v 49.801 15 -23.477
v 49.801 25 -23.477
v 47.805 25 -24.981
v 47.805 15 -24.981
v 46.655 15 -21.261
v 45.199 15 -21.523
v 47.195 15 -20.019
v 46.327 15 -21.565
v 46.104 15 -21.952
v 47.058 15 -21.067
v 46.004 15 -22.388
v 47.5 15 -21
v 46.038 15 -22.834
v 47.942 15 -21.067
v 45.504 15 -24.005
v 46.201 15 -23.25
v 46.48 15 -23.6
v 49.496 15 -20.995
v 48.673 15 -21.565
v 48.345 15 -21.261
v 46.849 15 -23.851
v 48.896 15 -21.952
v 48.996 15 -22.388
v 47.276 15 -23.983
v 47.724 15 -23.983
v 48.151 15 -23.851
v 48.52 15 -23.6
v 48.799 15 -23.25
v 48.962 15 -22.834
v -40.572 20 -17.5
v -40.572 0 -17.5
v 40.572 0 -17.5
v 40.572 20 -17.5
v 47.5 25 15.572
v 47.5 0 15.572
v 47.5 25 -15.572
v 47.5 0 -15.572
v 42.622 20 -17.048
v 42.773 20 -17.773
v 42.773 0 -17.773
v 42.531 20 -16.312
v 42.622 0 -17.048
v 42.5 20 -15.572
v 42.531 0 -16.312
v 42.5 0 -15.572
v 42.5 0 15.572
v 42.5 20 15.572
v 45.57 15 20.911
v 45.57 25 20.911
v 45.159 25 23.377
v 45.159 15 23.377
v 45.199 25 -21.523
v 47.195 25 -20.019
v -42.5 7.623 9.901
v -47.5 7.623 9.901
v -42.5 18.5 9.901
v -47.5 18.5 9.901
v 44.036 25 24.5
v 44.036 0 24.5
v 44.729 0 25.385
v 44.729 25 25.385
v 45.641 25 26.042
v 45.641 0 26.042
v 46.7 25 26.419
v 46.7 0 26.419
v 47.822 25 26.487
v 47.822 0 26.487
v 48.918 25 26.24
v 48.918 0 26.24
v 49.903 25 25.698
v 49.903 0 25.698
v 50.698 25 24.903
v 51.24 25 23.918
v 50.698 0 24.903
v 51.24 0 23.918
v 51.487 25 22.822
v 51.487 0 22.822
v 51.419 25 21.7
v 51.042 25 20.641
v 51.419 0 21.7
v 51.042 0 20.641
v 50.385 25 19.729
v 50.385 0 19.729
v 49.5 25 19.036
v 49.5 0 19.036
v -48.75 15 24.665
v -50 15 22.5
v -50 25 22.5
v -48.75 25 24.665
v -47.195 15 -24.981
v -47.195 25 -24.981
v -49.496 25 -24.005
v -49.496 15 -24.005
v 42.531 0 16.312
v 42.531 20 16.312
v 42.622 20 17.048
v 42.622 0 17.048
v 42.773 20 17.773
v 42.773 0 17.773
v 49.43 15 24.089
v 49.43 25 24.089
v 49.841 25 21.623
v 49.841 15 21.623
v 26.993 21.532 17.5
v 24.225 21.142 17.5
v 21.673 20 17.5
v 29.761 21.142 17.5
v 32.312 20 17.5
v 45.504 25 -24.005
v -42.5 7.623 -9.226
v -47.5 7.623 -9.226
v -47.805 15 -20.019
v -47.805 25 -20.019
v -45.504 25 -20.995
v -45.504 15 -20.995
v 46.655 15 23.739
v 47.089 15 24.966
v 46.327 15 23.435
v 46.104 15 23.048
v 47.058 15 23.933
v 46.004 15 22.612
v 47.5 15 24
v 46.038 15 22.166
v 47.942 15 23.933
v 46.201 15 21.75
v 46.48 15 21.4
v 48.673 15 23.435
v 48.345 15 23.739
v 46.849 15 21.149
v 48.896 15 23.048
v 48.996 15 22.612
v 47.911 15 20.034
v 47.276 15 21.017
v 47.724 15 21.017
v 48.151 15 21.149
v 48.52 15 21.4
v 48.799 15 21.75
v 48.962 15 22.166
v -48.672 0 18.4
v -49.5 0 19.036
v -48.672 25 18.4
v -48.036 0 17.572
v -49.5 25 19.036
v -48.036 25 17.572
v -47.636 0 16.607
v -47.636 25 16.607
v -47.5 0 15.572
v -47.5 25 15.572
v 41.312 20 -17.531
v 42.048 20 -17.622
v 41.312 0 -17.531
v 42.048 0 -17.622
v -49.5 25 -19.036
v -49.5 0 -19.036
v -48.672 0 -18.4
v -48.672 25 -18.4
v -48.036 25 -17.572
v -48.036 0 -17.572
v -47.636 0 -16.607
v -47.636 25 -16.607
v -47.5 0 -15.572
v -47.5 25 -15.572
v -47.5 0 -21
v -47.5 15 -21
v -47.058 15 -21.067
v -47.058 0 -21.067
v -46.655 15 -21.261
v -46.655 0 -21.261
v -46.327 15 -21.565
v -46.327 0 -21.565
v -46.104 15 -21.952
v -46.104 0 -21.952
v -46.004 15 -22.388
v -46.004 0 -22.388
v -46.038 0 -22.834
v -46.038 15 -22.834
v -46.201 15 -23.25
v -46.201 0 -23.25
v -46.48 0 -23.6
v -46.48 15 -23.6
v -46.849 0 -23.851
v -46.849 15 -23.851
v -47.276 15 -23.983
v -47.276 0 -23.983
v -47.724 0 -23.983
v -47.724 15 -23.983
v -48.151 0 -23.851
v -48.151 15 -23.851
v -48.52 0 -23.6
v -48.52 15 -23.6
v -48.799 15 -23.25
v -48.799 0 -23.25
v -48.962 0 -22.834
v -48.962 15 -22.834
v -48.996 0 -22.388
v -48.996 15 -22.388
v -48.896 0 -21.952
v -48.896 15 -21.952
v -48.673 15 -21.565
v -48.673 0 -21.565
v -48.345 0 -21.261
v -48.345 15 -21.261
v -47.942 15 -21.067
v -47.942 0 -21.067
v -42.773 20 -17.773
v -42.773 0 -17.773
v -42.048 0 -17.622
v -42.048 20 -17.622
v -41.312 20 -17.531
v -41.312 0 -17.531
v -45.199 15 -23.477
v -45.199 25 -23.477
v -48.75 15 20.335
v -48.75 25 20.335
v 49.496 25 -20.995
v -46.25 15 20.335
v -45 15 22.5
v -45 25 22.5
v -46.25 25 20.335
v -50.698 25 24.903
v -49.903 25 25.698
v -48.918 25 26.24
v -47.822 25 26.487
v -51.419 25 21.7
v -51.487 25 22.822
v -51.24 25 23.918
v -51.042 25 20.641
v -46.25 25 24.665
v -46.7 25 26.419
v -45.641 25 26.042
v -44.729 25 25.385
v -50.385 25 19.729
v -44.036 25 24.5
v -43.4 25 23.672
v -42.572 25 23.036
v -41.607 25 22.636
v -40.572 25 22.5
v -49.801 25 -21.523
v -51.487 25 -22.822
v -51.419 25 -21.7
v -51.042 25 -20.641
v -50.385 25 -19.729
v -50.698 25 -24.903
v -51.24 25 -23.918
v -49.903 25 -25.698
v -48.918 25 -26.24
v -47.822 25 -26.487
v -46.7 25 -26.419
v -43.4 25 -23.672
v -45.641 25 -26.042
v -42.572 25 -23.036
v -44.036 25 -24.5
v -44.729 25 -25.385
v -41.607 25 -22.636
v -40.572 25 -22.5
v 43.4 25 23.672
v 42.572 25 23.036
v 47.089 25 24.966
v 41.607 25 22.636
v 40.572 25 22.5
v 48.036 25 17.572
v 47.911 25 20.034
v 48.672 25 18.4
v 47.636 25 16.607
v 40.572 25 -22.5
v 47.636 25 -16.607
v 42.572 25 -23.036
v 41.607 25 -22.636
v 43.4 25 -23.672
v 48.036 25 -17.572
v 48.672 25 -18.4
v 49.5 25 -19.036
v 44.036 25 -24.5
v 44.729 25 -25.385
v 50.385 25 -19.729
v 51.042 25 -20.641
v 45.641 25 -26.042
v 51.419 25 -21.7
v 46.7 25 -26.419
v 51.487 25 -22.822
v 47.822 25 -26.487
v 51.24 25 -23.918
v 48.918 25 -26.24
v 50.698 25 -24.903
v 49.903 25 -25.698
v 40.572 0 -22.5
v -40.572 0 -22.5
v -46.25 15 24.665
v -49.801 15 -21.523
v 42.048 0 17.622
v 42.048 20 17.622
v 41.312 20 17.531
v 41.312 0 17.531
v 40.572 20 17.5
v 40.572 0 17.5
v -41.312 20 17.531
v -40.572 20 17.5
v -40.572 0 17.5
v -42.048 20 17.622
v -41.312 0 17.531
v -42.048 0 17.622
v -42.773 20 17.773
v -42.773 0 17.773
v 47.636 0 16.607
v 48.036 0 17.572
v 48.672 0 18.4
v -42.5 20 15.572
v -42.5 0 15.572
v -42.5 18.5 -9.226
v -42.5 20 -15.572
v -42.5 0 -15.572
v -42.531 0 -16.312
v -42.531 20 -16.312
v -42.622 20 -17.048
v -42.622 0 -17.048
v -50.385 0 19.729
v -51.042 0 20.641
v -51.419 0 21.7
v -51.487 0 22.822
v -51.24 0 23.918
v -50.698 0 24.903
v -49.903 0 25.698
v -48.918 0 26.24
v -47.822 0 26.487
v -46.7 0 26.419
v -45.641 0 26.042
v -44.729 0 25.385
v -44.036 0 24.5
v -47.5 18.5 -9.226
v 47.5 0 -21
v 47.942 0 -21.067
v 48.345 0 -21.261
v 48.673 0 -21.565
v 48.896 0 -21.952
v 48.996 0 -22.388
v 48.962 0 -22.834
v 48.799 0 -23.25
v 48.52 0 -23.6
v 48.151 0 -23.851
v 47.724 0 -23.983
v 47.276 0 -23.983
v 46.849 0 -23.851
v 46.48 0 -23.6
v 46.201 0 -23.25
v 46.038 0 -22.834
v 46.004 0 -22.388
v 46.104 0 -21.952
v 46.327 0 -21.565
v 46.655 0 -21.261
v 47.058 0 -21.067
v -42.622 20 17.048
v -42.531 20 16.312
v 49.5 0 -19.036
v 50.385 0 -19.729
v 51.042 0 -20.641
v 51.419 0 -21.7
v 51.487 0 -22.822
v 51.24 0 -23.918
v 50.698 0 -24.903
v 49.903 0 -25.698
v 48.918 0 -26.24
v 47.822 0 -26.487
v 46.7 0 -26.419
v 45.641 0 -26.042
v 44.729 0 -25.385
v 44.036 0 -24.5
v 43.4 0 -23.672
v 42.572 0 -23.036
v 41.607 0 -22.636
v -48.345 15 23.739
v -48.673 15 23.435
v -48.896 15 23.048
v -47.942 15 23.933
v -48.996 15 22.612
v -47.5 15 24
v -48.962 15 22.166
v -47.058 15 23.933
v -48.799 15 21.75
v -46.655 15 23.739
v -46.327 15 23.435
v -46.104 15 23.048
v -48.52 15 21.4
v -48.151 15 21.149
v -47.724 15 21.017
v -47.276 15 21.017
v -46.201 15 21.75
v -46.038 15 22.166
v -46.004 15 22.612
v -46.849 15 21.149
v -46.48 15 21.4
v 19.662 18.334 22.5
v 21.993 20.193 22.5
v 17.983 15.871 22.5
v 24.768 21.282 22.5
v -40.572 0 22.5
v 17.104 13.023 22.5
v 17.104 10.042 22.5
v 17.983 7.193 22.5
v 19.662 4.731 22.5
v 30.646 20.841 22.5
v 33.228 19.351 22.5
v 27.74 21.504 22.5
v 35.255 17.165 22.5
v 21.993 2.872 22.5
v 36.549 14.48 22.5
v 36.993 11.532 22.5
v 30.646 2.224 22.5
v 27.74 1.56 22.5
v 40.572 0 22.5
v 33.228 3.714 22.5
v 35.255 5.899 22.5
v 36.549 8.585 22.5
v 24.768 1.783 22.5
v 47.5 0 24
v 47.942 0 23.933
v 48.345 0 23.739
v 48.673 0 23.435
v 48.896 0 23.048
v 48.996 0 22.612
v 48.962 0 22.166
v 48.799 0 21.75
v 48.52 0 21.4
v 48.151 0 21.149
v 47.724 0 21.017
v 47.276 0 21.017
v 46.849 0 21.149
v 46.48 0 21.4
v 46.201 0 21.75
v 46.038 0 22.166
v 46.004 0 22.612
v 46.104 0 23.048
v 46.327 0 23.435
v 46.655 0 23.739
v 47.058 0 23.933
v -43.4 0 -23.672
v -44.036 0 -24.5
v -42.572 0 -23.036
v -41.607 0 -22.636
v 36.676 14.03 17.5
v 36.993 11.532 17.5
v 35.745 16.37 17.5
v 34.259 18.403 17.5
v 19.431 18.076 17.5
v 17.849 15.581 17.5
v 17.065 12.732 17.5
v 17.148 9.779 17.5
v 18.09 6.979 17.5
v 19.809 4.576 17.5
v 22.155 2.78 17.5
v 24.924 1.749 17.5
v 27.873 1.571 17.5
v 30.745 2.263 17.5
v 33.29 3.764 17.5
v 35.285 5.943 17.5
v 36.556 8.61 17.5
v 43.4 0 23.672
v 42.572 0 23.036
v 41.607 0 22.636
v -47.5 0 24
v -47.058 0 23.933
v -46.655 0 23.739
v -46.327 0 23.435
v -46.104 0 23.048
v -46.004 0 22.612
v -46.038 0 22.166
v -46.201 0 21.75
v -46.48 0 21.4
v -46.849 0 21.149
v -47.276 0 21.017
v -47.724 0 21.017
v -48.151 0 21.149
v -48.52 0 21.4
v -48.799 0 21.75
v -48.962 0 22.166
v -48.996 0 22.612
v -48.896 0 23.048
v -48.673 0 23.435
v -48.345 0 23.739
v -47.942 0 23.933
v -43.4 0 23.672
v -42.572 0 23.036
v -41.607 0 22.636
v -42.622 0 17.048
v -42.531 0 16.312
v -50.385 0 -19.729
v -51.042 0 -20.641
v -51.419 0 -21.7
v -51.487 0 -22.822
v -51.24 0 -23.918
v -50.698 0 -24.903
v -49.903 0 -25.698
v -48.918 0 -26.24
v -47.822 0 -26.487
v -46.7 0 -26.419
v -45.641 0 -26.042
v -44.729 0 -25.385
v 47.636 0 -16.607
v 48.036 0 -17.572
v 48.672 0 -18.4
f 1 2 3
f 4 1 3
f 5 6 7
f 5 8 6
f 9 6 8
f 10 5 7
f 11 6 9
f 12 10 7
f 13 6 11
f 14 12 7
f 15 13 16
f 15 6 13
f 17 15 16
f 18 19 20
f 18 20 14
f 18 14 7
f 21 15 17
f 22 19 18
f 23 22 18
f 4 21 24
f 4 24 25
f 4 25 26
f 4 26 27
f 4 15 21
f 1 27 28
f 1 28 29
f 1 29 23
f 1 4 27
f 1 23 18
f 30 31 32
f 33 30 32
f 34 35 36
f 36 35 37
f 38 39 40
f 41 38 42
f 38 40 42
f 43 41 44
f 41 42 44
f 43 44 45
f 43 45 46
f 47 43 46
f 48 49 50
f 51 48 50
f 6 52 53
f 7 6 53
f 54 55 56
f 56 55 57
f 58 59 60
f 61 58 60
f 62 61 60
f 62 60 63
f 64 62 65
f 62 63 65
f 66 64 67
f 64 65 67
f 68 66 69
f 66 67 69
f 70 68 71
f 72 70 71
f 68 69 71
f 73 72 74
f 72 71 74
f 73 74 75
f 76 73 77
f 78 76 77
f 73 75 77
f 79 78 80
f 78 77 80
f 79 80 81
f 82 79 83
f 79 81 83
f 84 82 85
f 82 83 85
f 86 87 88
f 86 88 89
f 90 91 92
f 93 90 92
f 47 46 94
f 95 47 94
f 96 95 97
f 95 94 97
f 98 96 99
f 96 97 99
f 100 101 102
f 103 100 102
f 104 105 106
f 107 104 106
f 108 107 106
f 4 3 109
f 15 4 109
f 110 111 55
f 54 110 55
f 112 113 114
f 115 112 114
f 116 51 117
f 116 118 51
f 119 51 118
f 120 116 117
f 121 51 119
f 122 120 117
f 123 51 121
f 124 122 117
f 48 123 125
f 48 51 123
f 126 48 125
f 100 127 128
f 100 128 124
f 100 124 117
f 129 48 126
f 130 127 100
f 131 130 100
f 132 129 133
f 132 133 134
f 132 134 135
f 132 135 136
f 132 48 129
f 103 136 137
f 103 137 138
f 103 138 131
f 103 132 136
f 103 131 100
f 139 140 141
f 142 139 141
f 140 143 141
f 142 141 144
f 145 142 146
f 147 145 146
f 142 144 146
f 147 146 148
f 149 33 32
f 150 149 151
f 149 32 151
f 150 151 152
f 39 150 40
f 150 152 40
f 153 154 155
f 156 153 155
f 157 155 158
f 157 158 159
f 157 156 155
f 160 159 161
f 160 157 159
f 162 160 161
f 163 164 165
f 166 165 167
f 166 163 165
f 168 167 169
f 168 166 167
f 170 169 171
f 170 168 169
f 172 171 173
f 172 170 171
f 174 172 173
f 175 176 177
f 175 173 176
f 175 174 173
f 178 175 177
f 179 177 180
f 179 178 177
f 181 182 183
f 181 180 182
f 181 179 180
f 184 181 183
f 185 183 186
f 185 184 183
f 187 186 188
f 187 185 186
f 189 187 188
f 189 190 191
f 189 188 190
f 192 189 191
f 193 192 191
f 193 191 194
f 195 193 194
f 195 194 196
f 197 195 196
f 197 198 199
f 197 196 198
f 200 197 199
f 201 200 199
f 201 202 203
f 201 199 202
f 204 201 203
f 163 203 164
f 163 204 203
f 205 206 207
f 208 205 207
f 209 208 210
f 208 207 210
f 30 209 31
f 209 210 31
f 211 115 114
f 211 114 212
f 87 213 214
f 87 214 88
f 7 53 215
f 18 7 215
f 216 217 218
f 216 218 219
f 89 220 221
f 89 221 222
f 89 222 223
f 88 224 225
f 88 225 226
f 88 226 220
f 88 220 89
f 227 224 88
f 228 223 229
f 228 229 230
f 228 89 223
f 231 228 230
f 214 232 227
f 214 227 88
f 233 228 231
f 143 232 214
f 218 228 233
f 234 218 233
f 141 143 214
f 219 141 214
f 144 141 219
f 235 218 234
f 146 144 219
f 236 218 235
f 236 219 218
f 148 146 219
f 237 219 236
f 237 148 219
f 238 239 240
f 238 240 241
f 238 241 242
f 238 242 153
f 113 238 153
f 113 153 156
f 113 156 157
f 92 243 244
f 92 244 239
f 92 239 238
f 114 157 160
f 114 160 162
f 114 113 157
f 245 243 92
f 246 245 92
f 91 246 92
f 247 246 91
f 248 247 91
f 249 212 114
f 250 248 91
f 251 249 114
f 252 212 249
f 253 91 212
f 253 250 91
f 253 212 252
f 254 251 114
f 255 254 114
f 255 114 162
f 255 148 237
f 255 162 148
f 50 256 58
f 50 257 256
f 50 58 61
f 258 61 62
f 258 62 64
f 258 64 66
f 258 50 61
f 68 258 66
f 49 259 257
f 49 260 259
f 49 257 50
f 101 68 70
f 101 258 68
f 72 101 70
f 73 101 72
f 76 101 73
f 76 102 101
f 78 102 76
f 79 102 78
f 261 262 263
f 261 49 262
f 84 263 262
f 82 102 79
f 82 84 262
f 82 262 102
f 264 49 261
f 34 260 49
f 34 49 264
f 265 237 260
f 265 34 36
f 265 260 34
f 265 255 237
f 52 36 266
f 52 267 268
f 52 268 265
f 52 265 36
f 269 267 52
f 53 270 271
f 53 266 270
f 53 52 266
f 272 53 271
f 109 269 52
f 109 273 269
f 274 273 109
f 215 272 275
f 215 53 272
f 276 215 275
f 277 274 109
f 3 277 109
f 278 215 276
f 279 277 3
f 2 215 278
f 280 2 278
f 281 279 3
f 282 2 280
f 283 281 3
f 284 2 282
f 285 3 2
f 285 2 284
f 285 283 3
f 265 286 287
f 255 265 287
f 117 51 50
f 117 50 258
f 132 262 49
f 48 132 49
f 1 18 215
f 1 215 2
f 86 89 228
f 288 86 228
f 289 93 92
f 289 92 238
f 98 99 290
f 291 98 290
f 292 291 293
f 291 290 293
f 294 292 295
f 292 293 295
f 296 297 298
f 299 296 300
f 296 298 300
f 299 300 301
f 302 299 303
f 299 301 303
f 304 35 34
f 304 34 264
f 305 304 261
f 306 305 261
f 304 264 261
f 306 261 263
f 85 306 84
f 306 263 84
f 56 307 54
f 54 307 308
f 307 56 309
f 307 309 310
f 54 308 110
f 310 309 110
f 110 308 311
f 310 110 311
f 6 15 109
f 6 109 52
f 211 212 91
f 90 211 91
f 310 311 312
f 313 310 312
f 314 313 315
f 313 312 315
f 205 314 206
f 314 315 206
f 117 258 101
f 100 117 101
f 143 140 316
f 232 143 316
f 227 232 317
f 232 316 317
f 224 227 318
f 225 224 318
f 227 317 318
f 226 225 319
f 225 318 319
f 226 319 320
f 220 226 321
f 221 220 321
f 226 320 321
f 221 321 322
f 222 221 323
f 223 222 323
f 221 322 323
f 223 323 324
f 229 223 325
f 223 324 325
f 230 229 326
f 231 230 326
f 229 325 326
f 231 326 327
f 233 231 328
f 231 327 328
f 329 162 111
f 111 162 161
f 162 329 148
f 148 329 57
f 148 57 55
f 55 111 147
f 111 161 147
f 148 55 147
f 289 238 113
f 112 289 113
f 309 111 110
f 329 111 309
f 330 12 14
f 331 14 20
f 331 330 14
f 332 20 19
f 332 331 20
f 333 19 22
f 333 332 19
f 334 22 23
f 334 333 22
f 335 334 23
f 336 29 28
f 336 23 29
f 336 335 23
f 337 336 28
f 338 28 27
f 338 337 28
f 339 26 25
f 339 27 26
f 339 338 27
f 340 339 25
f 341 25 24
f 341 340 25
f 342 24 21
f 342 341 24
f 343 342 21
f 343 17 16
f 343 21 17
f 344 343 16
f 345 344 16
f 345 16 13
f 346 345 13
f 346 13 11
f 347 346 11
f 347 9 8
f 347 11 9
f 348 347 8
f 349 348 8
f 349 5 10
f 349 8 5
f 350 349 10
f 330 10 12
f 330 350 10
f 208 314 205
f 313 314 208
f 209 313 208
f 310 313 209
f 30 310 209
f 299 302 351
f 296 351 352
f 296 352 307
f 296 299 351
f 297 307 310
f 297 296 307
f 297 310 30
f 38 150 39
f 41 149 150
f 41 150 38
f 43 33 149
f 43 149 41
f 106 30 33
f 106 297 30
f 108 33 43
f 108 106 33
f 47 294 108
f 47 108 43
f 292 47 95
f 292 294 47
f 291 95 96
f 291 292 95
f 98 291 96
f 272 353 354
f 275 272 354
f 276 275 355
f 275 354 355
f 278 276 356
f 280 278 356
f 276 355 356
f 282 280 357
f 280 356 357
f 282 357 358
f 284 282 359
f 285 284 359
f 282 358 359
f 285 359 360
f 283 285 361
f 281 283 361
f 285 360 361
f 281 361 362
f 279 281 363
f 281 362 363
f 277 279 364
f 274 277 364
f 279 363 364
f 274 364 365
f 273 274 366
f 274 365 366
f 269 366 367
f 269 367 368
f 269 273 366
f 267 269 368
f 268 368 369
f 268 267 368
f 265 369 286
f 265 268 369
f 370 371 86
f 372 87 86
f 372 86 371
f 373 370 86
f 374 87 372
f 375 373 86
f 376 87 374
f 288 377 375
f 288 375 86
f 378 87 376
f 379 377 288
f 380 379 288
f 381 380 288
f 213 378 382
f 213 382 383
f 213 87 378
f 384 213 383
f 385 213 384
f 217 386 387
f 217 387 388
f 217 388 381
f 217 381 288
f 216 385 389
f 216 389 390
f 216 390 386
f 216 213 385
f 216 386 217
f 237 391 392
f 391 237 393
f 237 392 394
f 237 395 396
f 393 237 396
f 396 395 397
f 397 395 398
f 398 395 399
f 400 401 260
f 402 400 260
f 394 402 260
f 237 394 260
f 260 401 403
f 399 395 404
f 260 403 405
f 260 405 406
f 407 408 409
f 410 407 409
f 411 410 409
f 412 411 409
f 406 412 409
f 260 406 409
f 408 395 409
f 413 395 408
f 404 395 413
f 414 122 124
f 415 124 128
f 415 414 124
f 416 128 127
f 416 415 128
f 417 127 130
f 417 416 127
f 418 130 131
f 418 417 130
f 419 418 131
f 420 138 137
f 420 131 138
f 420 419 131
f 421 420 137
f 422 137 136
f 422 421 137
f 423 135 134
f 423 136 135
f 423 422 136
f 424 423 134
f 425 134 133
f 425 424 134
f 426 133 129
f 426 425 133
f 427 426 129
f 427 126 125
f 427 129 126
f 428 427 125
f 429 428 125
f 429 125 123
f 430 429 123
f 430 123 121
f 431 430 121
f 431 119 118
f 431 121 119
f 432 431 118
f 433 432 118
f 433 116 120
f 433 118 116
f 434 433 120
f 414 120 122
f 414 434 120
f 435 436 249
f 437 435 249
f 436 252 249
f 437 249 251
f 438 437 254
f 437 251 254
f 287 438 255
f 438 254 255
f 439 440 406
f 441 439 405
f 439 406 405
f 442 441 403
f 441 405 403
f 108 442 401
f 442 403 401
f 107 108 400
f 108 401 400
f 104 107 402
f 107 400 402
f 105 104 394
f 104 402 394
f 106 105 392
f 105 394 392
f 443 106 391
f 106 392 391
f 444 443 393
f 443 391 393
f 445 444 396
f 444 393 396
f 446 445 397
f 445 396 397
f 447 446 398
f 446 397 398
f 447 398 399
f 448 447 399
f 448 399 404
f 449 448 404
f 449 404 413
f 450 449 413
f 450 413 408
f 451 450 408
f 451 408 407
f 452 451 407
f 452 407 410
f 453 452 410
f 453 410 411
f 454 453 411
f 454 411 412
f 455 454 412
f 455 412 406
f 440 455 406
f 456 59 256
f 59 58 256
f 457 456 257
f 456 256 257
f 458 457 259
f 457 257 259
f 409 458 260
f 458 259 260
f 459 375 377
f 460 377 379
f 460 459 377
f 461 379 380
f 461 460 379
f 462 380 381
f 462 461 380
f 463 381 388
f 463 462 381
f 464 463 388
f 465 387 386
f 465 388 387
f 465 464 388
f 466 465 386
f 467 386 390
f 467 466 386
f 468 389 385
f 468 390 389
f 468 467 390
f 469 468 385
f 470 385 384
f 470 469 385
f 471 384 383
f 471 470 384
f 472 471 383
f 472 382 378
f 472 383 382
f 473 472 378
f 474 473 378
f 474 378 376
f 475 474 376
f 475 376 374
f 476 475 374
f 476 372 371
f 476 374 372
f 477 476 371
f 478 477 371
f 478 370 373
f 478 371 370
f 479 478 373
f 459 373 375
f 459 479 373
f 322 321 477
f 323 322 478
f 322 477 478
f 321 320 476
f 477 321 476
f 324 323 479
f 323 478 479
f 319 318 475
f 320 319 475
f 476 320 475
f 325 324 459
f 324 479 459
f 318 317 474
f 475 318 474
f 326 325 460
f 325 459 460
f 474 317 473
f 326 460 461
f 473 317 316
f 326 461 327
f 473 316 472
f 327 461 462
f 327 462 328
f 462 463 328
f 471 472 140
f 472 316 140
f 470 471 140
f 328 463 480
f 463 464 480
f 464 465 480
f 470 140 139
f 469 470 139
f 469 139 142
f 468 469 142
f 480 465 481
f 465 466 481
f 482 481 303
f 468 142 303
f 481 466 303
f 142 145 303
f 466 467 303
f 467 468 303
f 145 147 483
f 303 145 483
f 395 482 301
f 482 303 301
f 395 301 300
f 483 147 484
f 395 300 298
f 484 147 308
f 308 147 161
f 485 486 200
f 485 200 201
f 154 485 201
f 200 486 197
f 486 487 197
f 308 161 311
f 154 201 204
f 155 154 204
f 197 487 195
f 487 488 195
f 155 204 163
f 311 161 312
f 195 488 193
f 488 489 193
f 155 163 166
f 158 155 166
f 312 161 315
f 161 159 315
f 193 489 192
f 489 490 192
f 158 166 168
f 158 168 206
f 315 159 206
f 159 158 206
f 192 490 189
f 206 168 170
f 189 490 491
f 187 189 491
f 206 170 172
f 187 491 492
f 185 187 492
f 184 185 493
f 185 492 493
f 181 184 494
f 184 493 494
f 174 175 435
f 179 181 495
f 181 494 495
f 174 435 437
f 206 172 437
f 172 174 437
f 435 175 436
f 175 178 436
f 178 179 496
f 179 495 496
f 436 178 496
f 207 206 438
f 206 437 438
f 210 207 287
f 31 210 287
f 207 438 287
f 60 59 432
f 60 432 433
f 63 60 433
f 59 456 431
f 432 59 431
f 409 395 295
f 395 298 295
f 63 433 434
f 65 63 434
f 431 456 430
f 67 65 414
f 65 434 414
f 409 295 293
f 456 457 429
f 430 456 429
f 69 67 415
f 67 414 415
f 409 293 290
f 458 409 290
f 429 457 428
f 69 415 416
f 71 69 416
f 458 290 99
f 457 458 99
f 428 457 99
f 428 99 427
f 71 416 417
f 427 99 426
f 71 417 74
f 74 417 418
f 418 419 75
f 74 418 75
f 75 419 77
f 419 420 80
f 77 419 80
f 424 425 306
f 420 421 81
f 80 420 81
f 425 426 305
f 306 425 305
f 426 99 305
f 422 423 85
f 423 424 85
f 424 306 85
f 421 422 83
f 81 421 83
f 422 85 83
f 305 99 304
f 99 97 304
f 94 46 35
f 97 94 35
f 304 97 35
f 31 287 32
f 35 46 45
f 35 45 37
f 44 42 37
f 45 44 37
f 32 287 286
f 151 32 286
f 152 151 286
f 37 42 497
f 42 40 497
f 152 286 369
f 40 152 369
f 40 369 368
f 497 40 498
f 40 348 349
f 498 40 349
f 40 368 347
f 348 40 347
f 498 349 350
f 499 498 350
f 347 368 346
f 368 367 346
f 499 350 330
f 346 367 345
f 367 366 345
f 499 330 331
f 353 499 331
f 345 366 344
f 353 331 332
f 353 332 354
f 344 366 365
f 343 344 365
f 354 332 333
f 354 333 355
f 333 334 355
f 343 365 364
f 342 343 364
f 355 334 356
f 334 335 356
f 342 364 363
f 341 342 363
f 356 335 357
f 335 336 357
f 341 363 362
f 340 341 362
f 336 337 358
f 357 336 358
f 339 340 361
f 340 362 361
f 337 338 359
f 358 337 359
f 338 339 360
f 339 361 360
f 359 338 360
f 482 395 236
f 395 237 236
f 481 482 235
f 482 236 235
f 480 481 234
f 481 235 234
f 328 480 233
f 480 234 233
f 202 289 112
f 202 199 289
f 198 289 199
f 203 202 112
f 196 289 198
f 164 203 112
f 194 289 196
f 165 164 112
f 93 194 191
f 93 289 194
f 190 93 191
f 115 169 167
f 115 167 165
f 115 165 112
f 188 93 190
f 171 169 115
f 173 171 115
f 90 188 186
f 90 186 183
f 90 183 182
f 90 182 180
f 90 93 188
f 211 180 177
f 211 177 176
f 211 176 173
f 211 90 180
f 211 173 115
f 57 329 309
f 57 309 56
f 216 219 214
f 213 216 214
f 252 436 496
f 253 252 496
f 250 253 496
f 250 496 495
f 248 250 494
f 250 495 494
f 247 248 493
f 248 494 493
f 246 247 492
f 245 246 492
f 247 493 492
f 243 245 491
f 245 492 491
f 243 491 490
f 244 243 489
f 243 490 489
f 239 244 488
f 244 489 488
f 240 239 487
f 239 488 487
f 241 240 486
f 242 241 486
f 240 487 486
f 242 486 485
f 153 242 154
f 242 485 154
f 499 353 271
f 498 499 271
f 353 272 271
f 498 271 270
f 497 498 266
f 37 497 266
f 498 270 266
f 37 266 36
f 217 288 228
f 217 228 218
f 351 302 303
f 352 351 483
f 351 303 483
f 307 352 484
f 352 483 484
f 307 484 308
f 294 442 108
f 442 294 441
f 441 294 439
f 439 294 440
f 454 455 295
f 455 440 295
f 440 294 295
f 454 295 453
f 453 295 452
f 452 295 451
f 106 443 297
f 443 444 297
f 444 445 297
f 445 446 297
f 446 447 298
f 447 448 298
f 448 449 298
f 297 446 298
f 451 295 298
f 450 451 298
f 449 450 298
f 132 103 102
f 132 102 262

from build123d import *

# Parameters (mm, degrees)
SKETCH2_R           = 1.5
BOSS_EXTRUDE1_DEPTH = 25
FILLET3_R           = 4
FILLET4_R           = 4
FILLET5_R           = 4
FILLET6_R           = 4
FILLET7_R           = 4
FILLET8_R           = 4
FILLET9_R           = 4
FILLET10_R          = 4
CUT_EXTRUDE1_DEPTH  = 10
CUT_EXTRUDE2_DEPTH  = 20
SKETCH5_W           = 19.12768352
SKETCH5_H           = 10.876940682
CUT_EXTRUDE3_DEPTH  = 5
SKETCH6_R           = 10
CUT_EXTRUDE4_DEPTH  = 5


with BuildPart() as part:
    # Sketch2 → Boss-Extrude1 (new body)
    with BuildSketch(Plane(origin=(0, 0, 0), x_dir=(1, 0, 0), z_dir=(0, 1, 0))):
        with BuildLine():
            ThreePointArc((-43.5, 22.5), (-50.328427125, 25.328427125), (-47.5, 18.5))
            Line((-47.5, 18.5), (-47.5, -18.5))
            ThreePointArc((-47.5, -18.5), (-50.328427125, -25.328427125), (-43.5, -22.5))
            Line((-43.5, -22.5), (43.5, -22.5))
            ThreePointArc((43.5, -22.5), (50.328427125, -25.328427125), (47.5, -18.5))
            Line((47.5, -18.5), (47.5, 18.5))
            ThreePointArc((47.5, 18.5), (50.328427125, 25.328427125), (43.5, 22.5))
            Line((43.5, 22.5), (-43.5, 22.5))
        make_face()
        with Locations(Location((-47.5, 22.5, 0), (0, 0, 270))):
            Circle(SKETCH2_R, mode=Mode.SUBTRACT)
        with Locations(Location((-47.5, -22.5, 0), (0, 0, 270))):
            Circle(SKETCH2_R, mode=Mode.SUBTRACT)
        with Locations(Location((47.5, 22.5, 0), (0, 0, 270))):
            Circle(SKETCH2_R, mode=Mode.SUBTRACT)
        with Locations(Location((47.5, -22.5, 0), (0, 0, 270))):
            Circle(SKETCH2_R, mode=Mode.SUBTRACT)
    extrude(amount=BOSS_EXTRUDE1_DEPTH)

    # Fillet3
    fillet3_edges = [part.edges().sort_by_distance(p)[0] for p in [
        (-43.5, 12.5, -22.5),
    ]]
    fillet(fillet3_edges, radius=FILLET3_R)

    # Fillet4
    fillet4_edges = [part.edges().sort_by_distance(p)[0] for p in [
        (-47.5, 12.5, -18.5),
    ]]
    fillet(fillet4_edges, radius=FILLET4_R)

    # Fillet5
    fillet5_edges = [part.edges().sort_by_distance(p)[0] for p in [
        (47.5, 12.5, -18.5),
    ]]
    fillet(fillet5_edges, radius=FILLET5_R)

    # Fillet6
    fillet6_edges = [part.edges().sort_by_distance(p)[0] for p in [
        (43.5, 12.5, -22.5),
    ]]
    fillet(fillet6_edges, radius=FILLET6_R)

    # Fillet7
    fillet7_edges = [part.edges().sort_by_distance(p)[0] for p in [
        (47.5, 12.5, 18.5),
    ]]
    fillet(fillet7_edges, radius=FILLET7_R)

    # Fillet8
    fillet8_edges = [part.edges().sort_by_distance(p)[0] for p in [
        (43.5, 12.5, 22.5),
    ]]
    fillet(fillet8_edges, radius=FILLET8_R)

    # Fillet9
    fillet9_edges = [part.edges().sort_by_distance(p)[0] for p in [
        (-43.5, 12.5, 22.5),
    ]]
    fillet(fillet9_edges, radius=FILLET9_R)

    # Fillet10
    fillet10_edges = [part.edges().sort_by_distance(p)[0] for p in [
        (-47.5, 12.5, 18.5),
    ]]
    fillet(fillet10_edges, radius=FILLET10_R)

    # Sketch3 → Cut-Extrude1 (cut)
    with BuildSketch(Plane(origin=(0, 25, 0), x_dir=(1, 0, 0), z_dir=(0, 1, 0))):
        Polygon((45.159037956, -23.377437582), (47.089402215, -24.96605139), (49.430364258, -24.088613808), (49.840962044, -21.622562418), (47.910597785, -20.03394861), (45.569635742, -20.911386192), align=None)
        Polygon((45.198650859, 21.523377181), (47.1951056, 20.018661771), (49.496454742, 20.99528459), (49.801349141, 23.476622819), (47.8048944, 24.981338229), (45.503545258, 24.00471541), align=None)
        Polygon((-49.801349141, 21.523377181), (-47.8048944, 20.018661771), (-45.503545258, 20.99528459), (-45.198650859, 23.476622819), (-47.1951056, 24.981338229), (-49.496454742, 24.00471541), align=None)
        Polygon((-50, -22.5), (-48.75, -24.665063509), (-46.25, -24.665063509), (-45, -22.5), (-46.25, -20.334936491), (-48.75, -20.334936491), align=None)
    extrude(amount=-CUT_EXTRUDE1_DEPTH, mode=Mode.SUBTRACT)

    # Sketch4 → Cut-Extrude2 (cut)
    with BuildSketch(Plane.XZ):
        with BuildLine():
            Line((-42.5, 15.57179677), (-42.5, -15.57179677))
            ThreePointArc((-42.5, -15.57179677), (-42.568623197, -16.681079599), (-42.77344631, -17.77344631))
            ThreePointArc((-42.77344631, -17.77344631), (-41.681079599, -17.568623197), (-40.57179677, -17.5))
            Line((-40.57179677, -17.5), (40.57179677, -17.5))
            ThreePointArc((40.57179677, -17.5), (41.681079599, -17.568623197), (42.77344631, -17.77344631))
            ThreePointArc((42.77344631, -17.77344631), (42.568623197, -16.681079599), (42.5, -15.57179677))
            Line((42.5, -15.57179677), (42.5, 15.57179677))
            ThreePointArc((42.5, 15.57179677), (42.568623197, 16.681079599), (42.77344631, 17.77344631))
            ThreePointArc((42.77344631, 17.77344631), (41.681079599, 17.568623197), (40.57179677, 17.5))
            Line((40.57179677, 17.5), (-40.57179677, 17.5))
            ThreePointArc((-40.57179677, 17.5), (-41.681079599, 17.568623197), (-42.77344631, 17.77344631))
            ThreePointArc((-42.77344631, 17.77344631), (-42.568623197, 16.681079599), (-42.5, 15.57179677))
        make_face()
    extrude(amount=-CUT_EXTRUDE2_DEPTH, mode=Mode.SUBTRACT)

    # Sketch5 → Cut-Extrude3 (cut)
    with BuildSketch(Plane.ZY.offset(47.5)):
        with Locations((0.337516279, 13.061529659)):
            Rectangle(SKETCH5_W, SKETCH5_H)
    extrude(amount=-CUT_EXTRUDE3_DEPTH, mode=Mode.SUBTRACT)

    # Sketch6 → Cut-Extrude4 (cut)
    with BuildSketch(Plane.XY.offset(22.5)):
        with Locations((26.992807924, 11.532259518)):
            Circle(SKETCH6_R)
    extrude(amount=-CUT_EXTRUDE4_DEPTH, mode=Mode.SUBTRACT)


solid = part.part
